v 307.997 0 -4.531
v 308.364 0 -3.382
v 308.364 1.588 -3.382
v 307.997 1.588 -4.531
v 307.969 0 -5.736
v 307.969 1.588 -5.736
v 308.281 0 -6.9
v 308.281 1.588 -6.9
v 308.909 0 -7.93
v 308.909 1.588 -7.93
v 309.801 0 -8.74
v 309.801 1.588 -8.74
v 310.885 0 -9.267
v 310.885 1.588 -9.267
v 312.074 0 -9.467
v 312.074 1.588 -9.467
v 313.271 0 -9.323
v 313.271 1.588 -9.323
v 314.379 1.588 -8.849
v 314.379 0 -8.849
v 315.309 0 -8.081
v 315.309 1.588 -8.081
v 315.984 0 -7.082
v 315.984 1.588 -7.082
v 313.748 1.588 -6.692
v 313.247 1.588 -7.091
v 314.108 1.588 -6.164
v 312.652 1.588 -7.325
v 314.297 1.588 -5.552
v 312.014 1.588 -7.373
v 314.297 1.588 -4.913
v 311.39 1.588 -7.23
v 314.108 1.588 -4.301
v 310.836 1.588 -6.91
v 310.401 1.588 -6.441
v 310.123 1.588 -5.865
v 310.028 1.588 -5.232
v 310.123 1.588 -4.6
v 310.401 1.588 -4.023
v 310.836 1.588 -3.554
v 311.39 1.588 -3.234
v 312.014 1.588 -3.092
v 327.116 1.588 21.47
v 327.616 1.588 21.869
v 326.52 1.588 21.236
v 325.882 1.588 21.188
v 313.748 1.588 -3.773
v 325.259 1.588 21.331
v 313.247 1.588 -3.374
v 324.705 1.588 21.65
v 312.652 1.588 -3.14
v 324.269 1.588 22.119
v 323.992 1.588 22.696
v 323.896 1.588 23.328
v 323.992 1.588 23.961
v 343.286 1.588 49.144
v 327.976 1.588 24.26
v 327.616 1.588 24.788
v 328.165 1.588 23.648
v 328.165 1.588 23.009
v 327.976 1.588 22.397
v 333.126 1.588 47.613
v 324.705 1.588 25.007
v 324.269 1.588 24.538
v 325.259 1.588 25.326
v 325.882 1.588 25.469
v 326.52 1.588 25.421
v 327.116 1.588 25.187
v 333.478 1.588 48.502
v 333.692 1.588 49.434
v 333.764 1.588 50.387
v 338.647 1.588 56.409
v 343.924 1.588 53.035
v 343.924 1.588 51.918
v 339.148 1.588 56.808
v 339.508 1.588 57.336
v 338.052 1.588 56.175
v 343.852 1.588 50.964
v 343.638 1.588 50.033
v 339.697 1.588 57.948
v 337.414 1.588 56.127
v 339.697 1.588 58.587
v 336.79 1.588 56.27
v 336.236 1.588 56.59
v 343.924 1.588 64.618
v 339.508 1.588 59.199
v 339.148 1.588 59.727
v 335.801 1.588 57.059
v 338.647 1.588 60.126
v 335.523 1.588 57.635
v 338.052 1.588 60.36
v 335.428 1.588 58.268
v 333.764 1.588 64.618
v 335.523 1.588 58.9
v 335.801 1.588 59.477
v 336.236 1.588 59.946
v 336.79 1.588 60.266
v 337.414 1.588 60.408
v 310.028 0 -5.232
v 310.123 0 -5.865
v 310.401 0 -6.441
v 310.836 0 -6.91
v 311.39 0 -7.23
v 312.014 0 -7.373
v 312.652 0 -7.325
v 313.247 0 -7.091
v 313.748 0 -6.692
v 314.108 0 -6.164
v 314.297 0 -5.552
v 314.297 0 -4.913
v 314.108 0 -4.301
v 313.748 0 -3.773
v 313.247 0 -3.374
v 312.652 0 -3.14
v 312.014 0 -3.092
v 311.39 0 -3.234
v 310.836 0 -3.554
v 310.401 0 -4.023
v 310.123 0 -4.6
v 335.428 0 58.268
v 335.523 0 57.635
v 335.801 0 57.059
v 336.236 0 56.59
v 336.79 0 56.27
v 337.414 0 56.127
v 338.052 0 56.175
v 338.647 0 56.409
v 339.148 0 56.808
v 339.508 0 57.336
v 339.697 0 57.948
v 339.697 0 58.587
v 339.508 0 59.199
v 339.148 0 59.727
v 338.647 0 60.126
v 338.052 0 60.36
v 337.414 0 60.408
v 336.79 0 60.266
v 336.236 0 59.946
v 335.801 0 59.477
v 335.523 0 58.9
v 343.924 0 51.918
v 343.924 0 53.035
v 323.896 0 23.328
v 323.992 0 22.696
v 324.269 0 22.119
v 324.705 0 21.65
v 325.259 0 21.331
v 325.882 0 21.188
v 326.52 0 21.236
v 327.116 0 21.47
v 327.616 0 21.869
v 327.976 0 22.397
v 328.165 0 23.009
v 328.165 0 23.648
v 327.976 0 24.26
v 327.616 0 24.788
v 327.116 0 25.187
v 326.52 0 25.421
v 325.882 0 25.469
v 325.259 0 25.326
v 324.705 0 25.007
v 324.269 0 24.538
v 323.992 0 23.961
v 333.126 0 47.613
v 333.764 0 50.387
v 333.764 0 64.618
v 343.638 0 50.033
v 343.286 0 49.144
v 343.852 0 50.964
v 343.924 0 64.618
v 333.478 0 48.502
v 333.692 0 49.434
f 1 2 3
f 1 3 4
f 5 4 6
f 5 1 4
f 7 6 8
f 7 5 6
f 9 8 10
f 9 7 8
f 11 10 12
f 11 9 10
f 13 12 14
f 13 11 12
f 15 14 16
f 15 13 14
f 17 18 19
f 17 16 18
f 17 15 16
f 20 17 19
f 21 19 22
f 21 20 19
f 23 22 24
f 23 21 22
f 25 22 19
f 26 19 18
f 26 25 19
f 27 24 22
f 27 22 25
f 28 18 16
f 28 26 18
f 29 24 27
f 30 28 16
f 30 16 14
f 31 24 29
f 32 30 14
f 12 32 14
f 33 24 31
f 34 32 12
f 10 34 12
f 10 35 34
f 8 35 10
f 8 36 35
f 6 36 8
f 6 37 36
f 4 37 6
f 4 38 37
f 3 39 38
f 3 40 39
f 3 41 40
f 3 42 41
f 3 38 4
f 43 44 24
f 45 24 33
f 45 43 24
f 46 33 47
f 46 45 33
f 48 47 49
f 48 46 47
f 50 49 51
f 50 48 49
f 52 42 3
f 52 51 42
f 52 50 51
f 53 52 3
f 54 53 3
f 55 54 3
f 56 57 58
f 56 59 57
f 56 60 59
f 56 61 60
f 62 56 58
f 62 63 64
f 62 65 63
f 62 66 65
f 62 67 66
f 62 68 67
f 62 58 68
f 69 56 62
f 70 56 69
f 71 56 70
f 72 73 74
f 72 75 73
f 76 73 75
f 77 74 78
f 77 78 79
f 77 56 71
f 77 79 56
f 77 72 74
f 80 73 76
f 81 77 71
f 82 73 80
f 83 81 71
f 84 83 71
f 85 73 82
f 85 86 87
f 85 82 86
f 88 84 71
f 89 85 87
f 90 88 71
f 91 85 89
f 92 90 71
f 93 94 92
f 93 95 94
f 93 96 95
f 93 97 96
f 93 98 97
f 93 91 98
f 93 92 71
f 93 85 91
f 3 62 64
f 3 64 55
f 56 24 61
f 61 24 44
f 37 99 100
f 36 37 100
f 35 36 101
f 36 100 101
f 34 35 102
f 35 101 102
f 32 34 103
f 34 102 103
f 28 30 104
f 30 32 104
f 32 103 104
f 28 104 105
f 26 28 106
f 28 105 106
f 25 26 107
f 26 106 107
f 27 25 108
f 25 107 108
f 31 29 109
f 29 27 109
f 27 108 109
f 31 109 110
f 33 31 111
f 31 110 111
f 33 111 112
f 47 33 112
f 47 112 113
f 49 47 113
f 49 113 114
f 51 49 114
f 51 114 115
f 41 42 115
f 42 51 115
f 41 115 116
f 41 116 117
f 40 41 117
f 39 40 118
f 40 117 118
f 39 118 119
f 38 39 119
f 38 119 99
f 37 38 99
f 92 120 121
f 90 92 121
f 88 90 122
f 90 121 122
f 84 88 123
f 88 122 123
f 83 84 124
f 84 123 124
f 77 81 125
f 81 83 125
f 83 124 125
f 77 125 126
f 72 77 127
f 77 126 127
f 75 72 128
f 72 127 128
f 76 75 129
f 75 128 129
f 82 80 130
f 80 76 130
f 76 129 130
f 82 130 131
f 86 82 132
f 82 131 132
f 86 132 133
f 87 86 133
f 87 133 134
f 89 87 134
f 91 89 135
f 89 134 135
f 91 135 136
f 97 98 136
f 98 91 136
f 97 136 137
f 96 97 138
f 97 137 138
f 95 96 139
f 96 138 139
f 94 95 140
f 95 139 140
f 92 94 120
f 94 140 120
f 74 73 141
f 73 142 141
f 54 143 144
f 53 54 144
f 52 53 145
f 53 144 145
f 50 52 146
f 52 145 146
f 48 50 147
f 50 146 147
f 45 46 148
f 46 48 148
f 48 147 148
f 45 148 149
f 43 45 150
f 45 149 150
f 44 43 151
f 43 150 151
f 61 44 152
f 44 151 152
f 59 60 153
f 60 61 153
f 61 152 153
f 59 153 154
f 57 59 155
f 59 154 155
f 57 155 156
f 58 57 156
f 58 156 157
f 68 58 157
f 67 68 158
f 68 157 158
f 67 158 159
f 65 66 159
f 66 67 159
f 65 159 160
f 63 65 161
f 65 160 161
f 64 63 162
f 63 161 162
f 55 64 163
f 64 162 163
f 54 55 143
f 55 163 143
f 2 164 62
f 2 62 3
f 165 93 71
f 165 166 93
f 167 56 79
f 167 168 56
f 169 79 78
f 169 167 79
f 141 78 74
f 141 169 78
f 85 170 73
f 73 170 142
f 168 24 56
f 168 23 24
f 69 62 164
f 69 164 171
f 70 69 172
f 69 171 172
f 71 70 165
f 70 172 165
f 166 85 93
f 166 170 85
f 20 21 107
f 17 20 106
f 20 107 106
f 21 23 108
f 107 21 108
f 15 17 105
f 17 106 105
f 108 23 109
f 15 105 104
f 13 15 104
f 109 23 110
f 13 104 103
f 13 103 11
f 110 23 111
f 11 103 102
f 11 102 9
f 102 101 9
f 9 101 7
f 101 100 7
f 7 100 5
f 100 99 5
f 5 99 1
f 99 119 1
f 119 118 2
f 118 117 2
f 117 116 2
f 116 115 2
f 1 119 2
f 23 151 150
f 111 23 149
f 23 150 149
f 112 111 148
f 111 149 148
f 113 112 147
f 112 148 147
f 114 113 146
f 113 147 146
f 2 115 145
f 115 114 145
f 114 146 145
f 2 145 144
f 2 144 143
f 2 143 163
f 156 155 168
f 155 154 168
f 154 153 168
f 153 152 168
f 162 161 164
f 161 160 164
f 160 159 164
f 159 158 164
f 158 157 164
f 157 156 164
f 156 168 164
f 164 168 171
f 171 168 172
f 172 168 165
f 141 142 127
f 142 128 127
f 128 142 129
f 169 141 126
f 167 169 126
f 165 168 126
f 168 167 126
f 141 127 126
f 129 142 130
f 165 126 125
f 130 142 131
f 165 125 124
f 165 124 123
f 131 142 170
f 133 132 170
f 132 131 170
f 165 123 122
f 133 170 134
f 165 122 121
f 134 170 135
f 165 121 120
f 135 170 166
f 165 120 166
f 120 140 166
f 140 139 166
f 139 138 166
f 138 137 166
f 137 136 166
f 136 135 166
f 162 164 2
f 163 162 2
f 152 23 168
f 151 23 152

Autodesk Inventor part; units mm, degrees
ref_plane "YZ Plane" through (0, 0, 0) normal (1, 0, 0) x (0, 1, 0)
ref_plane "XZ Plane" through (0, 0, 0) normal (0, 1, 0) x (-1, 0, 0)
ref_plane "XY Plane" through (0, 0, 0) normal (0, 0, 1) x (1, 0, 0)
sketch "Sketch2" plane through (0, 0, 0) normal (0, 1, 0) x (-1, 0, 0)
  arc A0 (-315.9842, -7.0824) -> (-308.3642, -3.3824) centre (-312.1742, -5.2324) ccw
  line L0 (-312.1742, -5.2324) -> (-308.3642, -3.3824) construction
  line L1 (-312.1742, -5.2324) -> (-315.9842, -7.0824) construction
  line L2 (-343.9242, 64.6176) -> (-343.9242, 51.9176)
  line L3 (-343.9242, 64.6176) -> (-343.9242, 53.0352)
  line L4 (-343.9242, 64.6176) -> (-333.7642, 64.6176)
  arc A1 (-343.9242, 51.9176) -> (-343.2864, 49.1439) centre (-337.5742, 51.9176) ccw
  line L5 (-315.9842, -7.0824) -> (-343.2864, 49.1439)
  line L6 (-333.7642, 64.6176) -> (-333.7642, 50.3868)
  arc A2 (-333.7642, 50.3868) -> (-333.1264, 47.6131) centre (-327.4142, 50.3868) ccw
  line L7 (-333.1264, 47.6131) -> (-308.3642, -3.3824)
  circle A3 centre (-337.5742, 58.2676) radius 2.1463
  circle A4 centre (-312.1742, -5.2324) radius 2.1463
  circle A5 centre (-326.0427, 23.3285) radius 2.1463
  point P0 (0, 0)
  dimension "d0" = 180
  dimension "d1" = 3.81
  dimension "d2" = 10.16
  dimension "d3" = 12.7
  dimension "d4" = 6.35
  dimension "d5" = 31.75
  dimension "d6" = 69.85
  dimension "d7" = 6.35
  dimension "d8" = 4.2926
  dimension "d9" = 4.2926
  dimension "d10" = 6.35
  dimension "d11" = 6.35
  dimension "d12" = 4.2926
  dimension "d13" = 31.75
  dimension "d14" = 4.2354
extrude "Extrusion1" add sketch "Sketch2" along normal blind 1.5875
properties part number "Front Guard"
